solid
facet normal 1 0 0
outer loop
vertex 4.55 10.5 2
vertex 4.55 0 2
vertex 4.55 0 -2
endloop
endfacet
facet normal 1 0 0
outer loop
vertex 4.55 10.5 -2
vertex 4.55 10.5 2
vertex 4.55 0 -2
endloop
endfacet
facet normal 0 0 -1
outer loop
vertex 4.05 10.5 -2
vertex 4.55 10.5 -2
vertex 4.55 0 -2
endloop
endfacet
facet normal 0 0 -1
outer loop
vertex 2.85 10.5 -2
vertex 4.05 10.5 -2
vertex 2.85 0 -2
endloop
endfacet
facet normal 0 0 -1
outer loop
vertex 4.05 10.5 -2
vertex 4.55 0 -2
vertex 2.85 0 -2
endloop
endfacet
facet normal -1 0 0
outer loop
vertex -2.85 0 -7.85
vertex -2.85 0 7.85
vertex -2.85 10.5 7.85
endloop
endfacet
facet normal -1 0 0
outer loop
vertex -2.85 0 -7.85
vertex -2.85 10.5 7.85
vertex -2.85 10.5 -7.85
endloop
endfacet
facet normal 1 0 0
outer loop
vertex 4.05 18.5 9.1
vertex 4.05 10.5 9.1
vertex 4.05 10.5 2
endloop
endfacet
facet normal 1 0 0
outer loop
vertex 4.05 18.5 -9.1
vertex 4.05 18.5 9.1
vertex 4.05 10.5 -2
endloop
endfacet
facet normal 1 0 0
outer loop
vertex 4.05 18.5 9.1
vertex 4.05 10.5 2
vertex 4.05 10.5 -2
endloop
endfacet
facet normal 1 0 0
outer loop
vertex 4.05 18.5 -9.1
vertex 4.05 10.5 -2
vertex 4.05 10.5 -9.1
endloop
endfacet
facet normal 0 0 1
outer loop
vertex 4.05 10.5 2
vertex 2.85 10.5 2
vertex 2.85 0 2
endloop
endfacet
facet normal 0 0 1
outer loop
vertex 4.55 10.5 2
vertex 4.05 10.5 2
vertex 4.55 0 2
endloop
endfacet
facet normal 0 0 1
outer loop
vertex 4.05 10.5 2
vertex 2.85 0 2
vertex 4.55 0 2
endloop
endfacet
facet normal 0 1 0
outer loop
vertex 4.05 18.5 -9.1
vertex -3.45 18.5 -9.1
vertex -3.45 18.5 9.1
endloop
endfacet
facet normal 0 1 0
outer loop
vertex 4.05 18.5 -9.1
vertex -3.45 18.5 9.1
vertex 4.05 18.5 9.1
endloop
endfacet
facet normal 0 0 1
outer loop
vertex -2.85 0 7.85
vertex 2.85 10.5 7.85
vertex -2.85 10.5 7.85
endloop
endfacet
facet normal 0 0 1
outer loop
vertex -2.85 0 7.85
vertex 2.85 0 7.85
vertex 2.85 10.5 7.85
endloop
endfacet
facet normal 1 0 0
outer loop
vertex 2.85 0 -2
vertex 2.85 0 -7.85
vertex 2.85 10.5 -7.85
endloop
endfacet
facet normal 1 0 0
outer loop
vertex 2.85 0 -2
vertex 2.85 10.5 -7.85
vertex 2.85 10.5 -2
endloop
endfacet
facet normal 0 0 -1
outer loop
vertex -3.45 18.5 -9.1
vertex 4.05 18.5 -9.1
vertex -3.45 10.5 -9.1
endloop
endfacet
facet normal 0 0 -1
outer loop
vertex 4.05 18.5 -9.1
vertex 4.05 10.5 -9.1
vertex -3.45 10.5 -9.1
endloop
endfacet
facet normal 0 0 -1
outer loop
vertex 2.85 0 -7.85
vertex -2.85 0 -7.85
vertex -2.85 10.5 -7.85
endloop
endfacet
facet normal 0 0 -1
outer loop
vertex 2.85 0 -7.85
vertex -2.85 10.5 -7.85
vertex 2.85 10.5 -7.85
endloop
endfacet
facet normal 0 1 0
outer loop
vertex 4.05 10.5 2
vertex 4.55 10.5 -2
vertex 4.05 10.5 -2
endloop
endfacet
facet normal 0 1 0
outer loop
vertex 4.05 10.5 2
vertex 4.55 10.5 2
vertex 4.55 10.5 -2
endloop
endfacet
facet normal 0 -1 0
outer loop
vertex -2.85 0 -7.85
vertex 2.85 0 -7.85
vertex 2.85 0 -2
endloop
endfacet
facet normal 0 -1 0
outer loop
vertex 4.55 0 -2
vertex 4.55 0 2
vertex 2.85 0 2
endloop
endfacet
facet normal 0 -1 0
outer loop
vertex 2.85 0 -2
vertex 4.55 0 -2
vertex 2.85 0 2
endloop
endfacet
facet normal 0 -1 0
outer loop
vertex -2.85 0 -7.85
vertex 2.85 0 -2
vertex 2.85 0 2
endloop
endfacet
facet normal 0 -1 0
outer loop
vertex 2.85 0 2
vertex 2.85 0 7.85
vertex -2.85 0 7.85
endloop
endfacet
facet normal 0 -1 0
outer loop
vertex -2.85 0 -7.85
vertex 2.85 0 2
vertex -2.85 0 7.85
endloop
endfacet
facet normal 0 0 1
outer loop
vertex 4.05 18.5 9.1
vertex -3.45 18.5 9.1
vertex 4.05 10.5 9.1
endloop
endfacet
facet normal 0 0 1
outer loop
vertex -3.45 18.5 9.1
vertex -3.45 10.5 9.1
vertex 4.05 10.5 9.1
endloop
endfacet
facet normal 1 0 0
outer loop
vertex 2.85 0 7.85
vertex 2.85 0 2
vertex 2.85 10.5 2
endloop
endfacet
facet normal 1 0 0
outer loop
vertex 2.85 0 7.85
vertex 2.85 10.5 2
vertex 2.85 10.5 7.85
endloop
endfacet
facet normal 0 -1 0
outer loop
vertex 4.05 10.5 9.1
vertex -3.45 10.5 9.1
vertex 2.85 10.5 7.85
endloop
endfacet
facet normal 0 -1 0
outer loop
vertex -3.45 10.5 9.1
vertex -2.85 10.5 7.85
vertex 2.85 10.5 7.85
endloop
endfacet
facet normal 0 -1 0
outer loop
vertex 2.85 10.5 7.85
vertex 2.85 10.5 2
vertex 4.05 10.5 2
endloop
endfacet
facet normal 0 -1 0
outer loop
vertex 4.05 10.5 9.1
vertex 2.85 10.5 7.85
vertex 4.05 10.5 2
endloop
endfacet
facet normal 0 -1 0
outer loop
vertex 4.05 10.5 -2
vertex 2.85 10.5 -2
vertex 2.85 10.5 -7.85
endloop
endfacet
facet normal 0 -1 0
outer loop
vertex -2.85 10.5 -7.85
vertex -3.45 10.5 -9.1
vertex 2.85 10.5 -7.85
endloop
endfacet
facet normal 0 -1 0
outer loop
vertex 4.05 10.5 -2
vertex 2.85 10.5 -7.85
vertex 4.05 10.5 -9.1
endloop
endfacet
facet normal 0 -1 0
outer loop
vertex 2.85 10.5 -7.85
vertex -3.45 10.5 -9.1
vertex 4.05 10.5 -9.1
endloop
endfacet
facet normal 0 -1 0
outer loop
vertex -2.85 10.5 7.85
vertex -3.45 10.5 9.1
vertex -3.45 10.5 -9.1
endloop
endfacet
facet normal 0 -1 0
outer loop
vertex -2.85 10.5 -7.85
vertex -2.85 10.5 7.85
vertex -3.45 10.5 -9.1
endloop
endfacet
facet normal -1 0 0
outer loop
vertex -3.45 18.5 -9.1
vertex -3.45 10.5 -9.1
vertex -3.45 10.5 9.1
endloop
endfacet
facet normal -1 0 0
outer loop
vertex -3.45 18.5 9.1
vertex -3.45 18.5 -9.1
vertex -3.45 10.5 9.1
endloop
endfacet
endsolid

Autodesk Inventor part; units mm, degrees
ref_plane "YZ Plane" through (0, 0, 0) normal (1, 0, 0) x (0, 1, 0)
ref_plane "XZ Plane" through (0, 0, 0) normal (0, 1, 0) x (-1, 0, 0)
ref_plane "XY Plane" through (0, 0, 0) normal (0, 0, 1) x (1, 0, 0)
sketch "Szkic1" plane through (0, 0, 0) normal (0, 1, 0) x (-1, 0, 0)
  line L0 (-2.85, 7.85) -> (2.85, 7.85)
  line L1 (2.85, 7.85) -> (2.85, -7.85)
  line L2 (2.85, -7.85) -> (-2.85, -7.85)
  line L3 (-2.85, -7.85) -> (-2.85, 7.85)
  line L4 (-2.85, 7.85) -> (2.85, -7.85) construction
  line L5 (2.85, 7.85) -> (-2.85, -7.85) construction
  line L6 (-2.85, 2) -> (-4.55, 2)
  line L7 (-4.55, 2) -> (-4.55, -2)
  line L8 (-4.55, -2) -> (-2.85, -2)
  line L9 (-2.85, -2) -> (-2.85, 2)
  point P0 (0, 0)
  dimension "d0" = 15.7
  dimension "d1" = 5.7
  dimension "d2" = 4
  dimension "d3" = 7.4
  dimension "d4" = 2
extrude "Wyciągnięcie proste1" add sketch "Szkic1" along normal blind 10.5
sketch "Szkic2" plane through (0, 10.5, 0) normal (0, 1, 0) x (1, 0, 0)
  line L0 (-3.45, -9.1) -> (4.05, -9.1)
  line L1 (4.05, -9.1) -> (4.05, 9.1)
  line L2 (4.05, 9.1) -> (-3.45, 9.1)
  line L3 (-3.45, 9.1) -> (-3.45, -9.1)
  line L4 (-3.45, -9.1) -> (4.05, 9.1) construction
  line L5 (4.05, -9.1) -> (-3.45, 9.1) construction
  line L6 (-2.85, 7.85) -> (-2.85, -7.85) projected
  line L7 (2.85, 2) -> (2.85, 7.85) projected
  point P0 (0, 0)
  point P1 (0.3, 0)
  point P2 (0.3, 0)
  dimension "d7" = 18.2
  dimension "d8" = 7.5
  dimension "d10" = 1.2
extrude "Wyciągnięcie proste2" add sketch "Szkic2" along normal blind 8
properties part number "Connector_female" material "Tworzywo sztuczne ABS"
